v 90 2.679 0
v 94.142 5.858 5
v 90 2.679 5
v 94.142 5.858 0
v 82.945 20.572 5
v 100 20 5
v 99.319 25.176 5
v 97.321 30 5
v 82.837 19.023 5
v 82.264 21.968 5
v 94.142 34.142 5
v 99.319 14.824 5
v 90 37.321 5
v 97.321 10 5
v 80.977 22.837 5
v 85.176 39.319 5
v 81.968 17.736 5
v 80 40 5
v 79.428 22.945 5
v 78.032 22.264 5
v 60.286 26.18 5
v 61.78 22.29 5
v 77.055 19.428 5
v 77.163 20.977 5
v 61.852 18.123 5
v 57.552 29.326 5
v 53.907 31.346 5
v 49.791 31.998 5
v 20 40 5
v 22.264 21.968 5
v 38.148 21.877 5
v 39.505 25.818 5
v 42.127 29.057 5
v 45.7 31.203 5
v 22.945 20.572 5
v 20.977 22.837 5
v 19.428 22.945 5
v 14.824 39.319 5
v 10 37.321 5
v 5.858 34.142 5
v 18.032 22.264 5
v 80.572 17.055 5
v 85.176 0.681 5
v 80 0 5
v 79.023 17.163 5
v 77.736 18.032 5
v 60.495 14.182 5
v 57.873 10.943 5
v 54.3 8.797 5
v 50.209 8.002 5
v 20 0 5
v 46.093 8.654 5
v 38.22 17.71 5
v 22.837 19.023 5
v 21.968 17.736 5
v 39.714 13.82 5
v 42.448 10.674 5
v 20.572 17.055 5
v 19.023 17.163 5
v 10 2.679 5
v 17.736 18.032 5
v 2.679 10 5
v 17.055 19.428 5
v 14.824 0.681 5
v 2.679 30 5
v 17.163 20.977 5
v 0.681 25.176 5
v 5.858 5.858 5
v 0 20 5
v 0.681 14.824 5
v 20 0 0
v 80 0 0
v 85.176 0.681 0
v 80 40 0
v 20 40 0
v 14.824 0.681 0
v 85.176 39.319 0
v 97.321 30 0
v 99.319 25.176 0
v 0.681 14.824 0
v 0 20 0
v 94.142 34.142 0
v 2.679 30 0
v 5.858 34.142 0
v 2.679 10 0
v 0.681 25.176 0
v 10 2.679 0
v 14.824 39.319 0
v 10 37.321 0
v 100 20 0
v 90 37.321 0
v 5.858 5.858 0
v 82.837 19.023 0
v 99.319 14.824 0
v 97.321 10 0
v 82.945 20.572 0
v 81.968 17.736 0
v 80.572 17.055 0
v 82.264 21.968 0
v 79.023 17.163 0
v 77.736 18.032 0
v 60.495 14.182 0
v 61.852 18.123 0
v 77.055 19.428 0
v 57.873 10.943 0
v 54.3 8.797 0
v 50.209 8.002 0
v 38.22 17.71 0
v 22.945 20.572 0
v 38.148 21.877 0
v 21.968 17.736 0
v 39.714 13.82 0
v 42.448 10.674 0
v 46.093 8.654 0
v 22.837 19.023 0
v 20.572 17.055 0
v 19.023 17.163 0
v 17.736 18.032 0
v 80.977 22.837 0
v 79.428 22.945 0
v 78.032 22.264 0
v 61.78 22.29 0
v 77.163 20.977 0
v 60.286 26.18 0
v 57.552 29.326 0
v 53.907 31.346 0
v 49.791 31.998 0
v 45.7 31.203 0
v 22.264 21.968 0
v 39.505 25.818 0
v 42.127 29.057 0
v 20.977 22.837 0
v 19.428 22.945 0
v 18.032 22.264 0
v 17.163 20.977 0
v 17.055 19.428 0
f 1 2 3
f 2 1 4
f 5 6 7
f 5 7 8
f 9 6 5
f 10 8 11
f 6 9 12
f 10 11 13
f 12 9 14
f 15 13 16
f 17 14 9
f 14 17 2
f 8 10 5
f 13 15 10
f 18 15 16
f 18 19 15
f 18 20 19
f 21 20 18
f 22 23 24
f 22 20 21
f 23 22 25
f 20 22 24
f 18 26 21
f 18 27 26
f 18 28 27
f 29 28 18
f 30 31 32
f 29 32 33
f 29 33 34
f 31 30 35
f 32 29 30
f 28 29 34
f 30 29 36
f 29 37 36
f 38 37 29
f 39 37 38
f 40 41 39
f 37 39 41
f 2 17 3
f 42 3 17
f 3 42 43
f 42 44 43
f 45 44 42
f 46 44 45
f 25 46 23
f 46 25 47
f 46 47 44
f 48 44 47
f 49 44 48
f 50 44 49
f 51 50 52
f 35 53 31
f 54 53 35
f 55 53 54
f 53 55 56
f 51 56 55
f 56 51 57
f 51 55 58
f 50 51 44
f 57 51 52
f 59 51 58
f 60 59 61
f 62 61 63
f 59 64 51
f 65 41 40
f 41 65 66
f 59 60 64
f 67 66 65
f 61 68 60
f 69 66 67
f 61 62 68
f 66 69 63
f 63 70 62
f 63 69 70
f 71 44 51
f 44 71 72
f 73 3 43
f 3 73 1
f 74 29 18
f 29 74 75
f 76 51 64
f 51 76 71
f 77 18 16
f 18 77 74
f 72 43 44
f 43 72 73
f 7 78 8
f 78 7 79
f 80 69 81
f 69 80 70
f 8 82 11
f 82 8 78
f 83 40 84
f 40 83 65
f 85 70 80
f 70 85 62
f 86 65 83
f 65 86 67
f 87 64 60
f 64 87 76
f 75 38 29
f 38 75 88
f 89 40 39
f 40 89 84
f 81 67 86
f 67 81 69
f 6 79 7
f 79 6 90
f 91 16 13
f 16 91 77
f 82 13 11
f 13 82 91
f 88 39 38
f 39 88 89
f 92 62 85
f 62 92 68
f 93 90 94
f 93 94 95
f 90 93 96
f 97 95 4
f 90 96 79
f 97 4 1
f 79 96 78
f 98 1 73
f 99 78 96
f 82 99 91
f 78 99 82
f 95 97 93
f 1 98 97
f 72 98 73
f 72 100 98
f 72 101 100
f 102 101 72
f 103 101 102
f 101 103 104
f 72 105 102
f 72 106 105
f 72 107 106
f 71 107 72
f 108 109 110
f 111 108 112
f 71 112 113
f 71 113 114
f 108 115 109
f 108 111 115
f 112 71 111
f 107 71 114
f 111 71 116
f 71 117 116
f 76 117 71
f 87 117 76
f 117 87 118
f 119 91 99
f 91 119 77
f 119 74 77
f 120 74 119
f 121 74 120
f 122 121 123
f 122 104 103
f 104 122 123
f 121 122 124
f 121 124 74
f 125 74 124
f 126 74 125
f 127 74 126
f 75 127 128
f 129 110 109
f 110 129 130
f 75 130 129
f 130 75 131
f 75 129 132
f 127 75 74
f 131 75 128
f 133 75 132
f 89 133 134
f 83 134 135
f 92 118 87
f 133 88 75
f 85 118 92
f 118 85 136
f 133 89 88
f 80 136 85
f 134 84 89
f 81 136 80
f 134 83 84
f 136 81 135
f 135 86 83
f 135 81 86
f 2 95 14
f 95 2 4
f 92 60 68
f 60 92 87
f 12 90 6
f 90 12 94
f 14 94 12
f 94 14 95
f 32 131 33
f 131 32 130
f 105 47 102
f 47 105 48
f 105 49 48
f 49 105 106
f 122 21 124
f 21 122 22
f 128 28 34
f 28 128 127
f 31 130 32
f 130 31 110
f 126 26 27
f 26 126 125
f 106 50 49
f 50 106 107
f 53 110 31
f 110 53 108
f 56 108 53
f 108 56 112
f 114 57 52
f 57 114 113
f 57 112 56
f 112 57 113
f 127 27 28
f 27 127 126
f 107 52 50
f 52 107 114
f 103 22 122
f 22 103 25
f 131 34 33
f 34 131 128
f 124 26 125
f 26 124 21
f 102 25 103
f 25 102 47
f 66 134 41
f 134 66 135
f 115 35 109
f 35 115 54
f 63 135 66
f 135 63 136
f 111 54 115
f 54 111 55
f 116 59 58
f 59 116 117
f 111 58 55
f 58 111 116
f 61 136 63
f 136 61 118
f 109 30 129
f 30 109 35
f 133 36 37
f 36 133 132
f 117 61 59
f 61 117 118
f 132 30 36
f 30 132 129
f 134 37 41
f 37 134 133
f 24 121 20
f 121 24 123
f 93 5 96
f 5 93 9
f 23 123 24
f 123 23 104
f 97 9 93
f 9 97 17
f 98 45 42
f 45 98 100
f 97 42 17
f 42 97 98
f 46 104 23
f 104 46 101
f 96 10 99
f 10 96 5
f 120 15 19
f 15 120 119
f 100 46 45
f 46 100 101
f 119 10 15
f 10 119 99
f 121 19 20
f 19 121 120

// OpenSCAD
$fn = 32;

// ----------------------------------------------------------------------
// Spacer plate: obround span 60, caps R20
// ----------------------------------------------------------------------

// --- parameters (mm) ---
bore_r = 12;              // centre bore radius
bolt_r = 3;               // bolt hole radius
plate_t = 5;              // plate thickness, Z (extrusion height)
span = 60;                // obround span
cap_r = 20;               // cap radius
fit_tol = 0.1;            // declared fit tolerance (prompt contract)
free_tol = 0.3;           // declared free tolerance (prompt contract)

profile = [[20, 40], [14.824, 39.319], [10, 37.321], [5.858, 34.142], [2.679, 30], [0.681, 25.176], [0, 20], [0.681, 14.824], [2.679, 10], [5.858, 5.858], [10, 2.679], [14.824, 0.681], [20, 0], [80, 0], [85.176, 0.681], [90, 2.679], [94.142, 5.858], [97.321, 10], [99.319, 14.824], [100, 20], [99.319, 25.176], [97.321, 30], [94.142, 34.142], [90, 37.321], [85.176, 39.319], [80, 40]];  // primary outline, 26 points, counter clockwise
void_1 = [[61.78, 22.29], [60.286, 26.18], [57.552, 29.326], [53.907, 31.346], [49.791, 31.998], [45.7, 31.203], [42.127, 29.057], [39.505, 25.818], [38.148, 21.877], [38.22, 17.71], [39.714, 13.82], [42.448, 10.674], [46.093, 8.654], [50.209, 8.002], [54.3, 8.797], [57.873, 10.943], [60.495, 14.182], [61.852, 18.123]];  // centre bore, 18 points
void_2 = [[22.945, 20.572], [22.264, 21.968], [20.977, 22.837], [19.428, 22.945], [18.032, 22.264], [17.163, 20.977], [17.055, 19.428], [17.736, 18.032], [19.023, 17.163], [20.572, 17.055], [21.968, 17.736], [22.837, 19.023]];  // end hole, 12 points
void_3 = [[82.945, 20.572], [82.264, 21.968], [80.977, 22.837], [79.428, 22.945], [78.032, 22.264], [77.163, 20.977], [77.055, 19.428], [77.736, 18.032], [79.023, 17.163], [80.572, 17.055], [81.968, 17.736], [82.837, 19.023]];  // end hole, 12 points

// --- the one profile operation ---
difference() {
  linear_extrude(height = plate_t) polygon(points = profile);
  translate([0, 0, -1])
    linear_extrude(height = plate_t + 2) polygon(points = void_1);
  translate([0, 0, -1])
    linear_extrude(height = plate_t + 2) polygon(points = void_2);
  translate([0, 0, -1])
    linear_extrude(height = plate_t + 2) polygon(points = void_3);
}
